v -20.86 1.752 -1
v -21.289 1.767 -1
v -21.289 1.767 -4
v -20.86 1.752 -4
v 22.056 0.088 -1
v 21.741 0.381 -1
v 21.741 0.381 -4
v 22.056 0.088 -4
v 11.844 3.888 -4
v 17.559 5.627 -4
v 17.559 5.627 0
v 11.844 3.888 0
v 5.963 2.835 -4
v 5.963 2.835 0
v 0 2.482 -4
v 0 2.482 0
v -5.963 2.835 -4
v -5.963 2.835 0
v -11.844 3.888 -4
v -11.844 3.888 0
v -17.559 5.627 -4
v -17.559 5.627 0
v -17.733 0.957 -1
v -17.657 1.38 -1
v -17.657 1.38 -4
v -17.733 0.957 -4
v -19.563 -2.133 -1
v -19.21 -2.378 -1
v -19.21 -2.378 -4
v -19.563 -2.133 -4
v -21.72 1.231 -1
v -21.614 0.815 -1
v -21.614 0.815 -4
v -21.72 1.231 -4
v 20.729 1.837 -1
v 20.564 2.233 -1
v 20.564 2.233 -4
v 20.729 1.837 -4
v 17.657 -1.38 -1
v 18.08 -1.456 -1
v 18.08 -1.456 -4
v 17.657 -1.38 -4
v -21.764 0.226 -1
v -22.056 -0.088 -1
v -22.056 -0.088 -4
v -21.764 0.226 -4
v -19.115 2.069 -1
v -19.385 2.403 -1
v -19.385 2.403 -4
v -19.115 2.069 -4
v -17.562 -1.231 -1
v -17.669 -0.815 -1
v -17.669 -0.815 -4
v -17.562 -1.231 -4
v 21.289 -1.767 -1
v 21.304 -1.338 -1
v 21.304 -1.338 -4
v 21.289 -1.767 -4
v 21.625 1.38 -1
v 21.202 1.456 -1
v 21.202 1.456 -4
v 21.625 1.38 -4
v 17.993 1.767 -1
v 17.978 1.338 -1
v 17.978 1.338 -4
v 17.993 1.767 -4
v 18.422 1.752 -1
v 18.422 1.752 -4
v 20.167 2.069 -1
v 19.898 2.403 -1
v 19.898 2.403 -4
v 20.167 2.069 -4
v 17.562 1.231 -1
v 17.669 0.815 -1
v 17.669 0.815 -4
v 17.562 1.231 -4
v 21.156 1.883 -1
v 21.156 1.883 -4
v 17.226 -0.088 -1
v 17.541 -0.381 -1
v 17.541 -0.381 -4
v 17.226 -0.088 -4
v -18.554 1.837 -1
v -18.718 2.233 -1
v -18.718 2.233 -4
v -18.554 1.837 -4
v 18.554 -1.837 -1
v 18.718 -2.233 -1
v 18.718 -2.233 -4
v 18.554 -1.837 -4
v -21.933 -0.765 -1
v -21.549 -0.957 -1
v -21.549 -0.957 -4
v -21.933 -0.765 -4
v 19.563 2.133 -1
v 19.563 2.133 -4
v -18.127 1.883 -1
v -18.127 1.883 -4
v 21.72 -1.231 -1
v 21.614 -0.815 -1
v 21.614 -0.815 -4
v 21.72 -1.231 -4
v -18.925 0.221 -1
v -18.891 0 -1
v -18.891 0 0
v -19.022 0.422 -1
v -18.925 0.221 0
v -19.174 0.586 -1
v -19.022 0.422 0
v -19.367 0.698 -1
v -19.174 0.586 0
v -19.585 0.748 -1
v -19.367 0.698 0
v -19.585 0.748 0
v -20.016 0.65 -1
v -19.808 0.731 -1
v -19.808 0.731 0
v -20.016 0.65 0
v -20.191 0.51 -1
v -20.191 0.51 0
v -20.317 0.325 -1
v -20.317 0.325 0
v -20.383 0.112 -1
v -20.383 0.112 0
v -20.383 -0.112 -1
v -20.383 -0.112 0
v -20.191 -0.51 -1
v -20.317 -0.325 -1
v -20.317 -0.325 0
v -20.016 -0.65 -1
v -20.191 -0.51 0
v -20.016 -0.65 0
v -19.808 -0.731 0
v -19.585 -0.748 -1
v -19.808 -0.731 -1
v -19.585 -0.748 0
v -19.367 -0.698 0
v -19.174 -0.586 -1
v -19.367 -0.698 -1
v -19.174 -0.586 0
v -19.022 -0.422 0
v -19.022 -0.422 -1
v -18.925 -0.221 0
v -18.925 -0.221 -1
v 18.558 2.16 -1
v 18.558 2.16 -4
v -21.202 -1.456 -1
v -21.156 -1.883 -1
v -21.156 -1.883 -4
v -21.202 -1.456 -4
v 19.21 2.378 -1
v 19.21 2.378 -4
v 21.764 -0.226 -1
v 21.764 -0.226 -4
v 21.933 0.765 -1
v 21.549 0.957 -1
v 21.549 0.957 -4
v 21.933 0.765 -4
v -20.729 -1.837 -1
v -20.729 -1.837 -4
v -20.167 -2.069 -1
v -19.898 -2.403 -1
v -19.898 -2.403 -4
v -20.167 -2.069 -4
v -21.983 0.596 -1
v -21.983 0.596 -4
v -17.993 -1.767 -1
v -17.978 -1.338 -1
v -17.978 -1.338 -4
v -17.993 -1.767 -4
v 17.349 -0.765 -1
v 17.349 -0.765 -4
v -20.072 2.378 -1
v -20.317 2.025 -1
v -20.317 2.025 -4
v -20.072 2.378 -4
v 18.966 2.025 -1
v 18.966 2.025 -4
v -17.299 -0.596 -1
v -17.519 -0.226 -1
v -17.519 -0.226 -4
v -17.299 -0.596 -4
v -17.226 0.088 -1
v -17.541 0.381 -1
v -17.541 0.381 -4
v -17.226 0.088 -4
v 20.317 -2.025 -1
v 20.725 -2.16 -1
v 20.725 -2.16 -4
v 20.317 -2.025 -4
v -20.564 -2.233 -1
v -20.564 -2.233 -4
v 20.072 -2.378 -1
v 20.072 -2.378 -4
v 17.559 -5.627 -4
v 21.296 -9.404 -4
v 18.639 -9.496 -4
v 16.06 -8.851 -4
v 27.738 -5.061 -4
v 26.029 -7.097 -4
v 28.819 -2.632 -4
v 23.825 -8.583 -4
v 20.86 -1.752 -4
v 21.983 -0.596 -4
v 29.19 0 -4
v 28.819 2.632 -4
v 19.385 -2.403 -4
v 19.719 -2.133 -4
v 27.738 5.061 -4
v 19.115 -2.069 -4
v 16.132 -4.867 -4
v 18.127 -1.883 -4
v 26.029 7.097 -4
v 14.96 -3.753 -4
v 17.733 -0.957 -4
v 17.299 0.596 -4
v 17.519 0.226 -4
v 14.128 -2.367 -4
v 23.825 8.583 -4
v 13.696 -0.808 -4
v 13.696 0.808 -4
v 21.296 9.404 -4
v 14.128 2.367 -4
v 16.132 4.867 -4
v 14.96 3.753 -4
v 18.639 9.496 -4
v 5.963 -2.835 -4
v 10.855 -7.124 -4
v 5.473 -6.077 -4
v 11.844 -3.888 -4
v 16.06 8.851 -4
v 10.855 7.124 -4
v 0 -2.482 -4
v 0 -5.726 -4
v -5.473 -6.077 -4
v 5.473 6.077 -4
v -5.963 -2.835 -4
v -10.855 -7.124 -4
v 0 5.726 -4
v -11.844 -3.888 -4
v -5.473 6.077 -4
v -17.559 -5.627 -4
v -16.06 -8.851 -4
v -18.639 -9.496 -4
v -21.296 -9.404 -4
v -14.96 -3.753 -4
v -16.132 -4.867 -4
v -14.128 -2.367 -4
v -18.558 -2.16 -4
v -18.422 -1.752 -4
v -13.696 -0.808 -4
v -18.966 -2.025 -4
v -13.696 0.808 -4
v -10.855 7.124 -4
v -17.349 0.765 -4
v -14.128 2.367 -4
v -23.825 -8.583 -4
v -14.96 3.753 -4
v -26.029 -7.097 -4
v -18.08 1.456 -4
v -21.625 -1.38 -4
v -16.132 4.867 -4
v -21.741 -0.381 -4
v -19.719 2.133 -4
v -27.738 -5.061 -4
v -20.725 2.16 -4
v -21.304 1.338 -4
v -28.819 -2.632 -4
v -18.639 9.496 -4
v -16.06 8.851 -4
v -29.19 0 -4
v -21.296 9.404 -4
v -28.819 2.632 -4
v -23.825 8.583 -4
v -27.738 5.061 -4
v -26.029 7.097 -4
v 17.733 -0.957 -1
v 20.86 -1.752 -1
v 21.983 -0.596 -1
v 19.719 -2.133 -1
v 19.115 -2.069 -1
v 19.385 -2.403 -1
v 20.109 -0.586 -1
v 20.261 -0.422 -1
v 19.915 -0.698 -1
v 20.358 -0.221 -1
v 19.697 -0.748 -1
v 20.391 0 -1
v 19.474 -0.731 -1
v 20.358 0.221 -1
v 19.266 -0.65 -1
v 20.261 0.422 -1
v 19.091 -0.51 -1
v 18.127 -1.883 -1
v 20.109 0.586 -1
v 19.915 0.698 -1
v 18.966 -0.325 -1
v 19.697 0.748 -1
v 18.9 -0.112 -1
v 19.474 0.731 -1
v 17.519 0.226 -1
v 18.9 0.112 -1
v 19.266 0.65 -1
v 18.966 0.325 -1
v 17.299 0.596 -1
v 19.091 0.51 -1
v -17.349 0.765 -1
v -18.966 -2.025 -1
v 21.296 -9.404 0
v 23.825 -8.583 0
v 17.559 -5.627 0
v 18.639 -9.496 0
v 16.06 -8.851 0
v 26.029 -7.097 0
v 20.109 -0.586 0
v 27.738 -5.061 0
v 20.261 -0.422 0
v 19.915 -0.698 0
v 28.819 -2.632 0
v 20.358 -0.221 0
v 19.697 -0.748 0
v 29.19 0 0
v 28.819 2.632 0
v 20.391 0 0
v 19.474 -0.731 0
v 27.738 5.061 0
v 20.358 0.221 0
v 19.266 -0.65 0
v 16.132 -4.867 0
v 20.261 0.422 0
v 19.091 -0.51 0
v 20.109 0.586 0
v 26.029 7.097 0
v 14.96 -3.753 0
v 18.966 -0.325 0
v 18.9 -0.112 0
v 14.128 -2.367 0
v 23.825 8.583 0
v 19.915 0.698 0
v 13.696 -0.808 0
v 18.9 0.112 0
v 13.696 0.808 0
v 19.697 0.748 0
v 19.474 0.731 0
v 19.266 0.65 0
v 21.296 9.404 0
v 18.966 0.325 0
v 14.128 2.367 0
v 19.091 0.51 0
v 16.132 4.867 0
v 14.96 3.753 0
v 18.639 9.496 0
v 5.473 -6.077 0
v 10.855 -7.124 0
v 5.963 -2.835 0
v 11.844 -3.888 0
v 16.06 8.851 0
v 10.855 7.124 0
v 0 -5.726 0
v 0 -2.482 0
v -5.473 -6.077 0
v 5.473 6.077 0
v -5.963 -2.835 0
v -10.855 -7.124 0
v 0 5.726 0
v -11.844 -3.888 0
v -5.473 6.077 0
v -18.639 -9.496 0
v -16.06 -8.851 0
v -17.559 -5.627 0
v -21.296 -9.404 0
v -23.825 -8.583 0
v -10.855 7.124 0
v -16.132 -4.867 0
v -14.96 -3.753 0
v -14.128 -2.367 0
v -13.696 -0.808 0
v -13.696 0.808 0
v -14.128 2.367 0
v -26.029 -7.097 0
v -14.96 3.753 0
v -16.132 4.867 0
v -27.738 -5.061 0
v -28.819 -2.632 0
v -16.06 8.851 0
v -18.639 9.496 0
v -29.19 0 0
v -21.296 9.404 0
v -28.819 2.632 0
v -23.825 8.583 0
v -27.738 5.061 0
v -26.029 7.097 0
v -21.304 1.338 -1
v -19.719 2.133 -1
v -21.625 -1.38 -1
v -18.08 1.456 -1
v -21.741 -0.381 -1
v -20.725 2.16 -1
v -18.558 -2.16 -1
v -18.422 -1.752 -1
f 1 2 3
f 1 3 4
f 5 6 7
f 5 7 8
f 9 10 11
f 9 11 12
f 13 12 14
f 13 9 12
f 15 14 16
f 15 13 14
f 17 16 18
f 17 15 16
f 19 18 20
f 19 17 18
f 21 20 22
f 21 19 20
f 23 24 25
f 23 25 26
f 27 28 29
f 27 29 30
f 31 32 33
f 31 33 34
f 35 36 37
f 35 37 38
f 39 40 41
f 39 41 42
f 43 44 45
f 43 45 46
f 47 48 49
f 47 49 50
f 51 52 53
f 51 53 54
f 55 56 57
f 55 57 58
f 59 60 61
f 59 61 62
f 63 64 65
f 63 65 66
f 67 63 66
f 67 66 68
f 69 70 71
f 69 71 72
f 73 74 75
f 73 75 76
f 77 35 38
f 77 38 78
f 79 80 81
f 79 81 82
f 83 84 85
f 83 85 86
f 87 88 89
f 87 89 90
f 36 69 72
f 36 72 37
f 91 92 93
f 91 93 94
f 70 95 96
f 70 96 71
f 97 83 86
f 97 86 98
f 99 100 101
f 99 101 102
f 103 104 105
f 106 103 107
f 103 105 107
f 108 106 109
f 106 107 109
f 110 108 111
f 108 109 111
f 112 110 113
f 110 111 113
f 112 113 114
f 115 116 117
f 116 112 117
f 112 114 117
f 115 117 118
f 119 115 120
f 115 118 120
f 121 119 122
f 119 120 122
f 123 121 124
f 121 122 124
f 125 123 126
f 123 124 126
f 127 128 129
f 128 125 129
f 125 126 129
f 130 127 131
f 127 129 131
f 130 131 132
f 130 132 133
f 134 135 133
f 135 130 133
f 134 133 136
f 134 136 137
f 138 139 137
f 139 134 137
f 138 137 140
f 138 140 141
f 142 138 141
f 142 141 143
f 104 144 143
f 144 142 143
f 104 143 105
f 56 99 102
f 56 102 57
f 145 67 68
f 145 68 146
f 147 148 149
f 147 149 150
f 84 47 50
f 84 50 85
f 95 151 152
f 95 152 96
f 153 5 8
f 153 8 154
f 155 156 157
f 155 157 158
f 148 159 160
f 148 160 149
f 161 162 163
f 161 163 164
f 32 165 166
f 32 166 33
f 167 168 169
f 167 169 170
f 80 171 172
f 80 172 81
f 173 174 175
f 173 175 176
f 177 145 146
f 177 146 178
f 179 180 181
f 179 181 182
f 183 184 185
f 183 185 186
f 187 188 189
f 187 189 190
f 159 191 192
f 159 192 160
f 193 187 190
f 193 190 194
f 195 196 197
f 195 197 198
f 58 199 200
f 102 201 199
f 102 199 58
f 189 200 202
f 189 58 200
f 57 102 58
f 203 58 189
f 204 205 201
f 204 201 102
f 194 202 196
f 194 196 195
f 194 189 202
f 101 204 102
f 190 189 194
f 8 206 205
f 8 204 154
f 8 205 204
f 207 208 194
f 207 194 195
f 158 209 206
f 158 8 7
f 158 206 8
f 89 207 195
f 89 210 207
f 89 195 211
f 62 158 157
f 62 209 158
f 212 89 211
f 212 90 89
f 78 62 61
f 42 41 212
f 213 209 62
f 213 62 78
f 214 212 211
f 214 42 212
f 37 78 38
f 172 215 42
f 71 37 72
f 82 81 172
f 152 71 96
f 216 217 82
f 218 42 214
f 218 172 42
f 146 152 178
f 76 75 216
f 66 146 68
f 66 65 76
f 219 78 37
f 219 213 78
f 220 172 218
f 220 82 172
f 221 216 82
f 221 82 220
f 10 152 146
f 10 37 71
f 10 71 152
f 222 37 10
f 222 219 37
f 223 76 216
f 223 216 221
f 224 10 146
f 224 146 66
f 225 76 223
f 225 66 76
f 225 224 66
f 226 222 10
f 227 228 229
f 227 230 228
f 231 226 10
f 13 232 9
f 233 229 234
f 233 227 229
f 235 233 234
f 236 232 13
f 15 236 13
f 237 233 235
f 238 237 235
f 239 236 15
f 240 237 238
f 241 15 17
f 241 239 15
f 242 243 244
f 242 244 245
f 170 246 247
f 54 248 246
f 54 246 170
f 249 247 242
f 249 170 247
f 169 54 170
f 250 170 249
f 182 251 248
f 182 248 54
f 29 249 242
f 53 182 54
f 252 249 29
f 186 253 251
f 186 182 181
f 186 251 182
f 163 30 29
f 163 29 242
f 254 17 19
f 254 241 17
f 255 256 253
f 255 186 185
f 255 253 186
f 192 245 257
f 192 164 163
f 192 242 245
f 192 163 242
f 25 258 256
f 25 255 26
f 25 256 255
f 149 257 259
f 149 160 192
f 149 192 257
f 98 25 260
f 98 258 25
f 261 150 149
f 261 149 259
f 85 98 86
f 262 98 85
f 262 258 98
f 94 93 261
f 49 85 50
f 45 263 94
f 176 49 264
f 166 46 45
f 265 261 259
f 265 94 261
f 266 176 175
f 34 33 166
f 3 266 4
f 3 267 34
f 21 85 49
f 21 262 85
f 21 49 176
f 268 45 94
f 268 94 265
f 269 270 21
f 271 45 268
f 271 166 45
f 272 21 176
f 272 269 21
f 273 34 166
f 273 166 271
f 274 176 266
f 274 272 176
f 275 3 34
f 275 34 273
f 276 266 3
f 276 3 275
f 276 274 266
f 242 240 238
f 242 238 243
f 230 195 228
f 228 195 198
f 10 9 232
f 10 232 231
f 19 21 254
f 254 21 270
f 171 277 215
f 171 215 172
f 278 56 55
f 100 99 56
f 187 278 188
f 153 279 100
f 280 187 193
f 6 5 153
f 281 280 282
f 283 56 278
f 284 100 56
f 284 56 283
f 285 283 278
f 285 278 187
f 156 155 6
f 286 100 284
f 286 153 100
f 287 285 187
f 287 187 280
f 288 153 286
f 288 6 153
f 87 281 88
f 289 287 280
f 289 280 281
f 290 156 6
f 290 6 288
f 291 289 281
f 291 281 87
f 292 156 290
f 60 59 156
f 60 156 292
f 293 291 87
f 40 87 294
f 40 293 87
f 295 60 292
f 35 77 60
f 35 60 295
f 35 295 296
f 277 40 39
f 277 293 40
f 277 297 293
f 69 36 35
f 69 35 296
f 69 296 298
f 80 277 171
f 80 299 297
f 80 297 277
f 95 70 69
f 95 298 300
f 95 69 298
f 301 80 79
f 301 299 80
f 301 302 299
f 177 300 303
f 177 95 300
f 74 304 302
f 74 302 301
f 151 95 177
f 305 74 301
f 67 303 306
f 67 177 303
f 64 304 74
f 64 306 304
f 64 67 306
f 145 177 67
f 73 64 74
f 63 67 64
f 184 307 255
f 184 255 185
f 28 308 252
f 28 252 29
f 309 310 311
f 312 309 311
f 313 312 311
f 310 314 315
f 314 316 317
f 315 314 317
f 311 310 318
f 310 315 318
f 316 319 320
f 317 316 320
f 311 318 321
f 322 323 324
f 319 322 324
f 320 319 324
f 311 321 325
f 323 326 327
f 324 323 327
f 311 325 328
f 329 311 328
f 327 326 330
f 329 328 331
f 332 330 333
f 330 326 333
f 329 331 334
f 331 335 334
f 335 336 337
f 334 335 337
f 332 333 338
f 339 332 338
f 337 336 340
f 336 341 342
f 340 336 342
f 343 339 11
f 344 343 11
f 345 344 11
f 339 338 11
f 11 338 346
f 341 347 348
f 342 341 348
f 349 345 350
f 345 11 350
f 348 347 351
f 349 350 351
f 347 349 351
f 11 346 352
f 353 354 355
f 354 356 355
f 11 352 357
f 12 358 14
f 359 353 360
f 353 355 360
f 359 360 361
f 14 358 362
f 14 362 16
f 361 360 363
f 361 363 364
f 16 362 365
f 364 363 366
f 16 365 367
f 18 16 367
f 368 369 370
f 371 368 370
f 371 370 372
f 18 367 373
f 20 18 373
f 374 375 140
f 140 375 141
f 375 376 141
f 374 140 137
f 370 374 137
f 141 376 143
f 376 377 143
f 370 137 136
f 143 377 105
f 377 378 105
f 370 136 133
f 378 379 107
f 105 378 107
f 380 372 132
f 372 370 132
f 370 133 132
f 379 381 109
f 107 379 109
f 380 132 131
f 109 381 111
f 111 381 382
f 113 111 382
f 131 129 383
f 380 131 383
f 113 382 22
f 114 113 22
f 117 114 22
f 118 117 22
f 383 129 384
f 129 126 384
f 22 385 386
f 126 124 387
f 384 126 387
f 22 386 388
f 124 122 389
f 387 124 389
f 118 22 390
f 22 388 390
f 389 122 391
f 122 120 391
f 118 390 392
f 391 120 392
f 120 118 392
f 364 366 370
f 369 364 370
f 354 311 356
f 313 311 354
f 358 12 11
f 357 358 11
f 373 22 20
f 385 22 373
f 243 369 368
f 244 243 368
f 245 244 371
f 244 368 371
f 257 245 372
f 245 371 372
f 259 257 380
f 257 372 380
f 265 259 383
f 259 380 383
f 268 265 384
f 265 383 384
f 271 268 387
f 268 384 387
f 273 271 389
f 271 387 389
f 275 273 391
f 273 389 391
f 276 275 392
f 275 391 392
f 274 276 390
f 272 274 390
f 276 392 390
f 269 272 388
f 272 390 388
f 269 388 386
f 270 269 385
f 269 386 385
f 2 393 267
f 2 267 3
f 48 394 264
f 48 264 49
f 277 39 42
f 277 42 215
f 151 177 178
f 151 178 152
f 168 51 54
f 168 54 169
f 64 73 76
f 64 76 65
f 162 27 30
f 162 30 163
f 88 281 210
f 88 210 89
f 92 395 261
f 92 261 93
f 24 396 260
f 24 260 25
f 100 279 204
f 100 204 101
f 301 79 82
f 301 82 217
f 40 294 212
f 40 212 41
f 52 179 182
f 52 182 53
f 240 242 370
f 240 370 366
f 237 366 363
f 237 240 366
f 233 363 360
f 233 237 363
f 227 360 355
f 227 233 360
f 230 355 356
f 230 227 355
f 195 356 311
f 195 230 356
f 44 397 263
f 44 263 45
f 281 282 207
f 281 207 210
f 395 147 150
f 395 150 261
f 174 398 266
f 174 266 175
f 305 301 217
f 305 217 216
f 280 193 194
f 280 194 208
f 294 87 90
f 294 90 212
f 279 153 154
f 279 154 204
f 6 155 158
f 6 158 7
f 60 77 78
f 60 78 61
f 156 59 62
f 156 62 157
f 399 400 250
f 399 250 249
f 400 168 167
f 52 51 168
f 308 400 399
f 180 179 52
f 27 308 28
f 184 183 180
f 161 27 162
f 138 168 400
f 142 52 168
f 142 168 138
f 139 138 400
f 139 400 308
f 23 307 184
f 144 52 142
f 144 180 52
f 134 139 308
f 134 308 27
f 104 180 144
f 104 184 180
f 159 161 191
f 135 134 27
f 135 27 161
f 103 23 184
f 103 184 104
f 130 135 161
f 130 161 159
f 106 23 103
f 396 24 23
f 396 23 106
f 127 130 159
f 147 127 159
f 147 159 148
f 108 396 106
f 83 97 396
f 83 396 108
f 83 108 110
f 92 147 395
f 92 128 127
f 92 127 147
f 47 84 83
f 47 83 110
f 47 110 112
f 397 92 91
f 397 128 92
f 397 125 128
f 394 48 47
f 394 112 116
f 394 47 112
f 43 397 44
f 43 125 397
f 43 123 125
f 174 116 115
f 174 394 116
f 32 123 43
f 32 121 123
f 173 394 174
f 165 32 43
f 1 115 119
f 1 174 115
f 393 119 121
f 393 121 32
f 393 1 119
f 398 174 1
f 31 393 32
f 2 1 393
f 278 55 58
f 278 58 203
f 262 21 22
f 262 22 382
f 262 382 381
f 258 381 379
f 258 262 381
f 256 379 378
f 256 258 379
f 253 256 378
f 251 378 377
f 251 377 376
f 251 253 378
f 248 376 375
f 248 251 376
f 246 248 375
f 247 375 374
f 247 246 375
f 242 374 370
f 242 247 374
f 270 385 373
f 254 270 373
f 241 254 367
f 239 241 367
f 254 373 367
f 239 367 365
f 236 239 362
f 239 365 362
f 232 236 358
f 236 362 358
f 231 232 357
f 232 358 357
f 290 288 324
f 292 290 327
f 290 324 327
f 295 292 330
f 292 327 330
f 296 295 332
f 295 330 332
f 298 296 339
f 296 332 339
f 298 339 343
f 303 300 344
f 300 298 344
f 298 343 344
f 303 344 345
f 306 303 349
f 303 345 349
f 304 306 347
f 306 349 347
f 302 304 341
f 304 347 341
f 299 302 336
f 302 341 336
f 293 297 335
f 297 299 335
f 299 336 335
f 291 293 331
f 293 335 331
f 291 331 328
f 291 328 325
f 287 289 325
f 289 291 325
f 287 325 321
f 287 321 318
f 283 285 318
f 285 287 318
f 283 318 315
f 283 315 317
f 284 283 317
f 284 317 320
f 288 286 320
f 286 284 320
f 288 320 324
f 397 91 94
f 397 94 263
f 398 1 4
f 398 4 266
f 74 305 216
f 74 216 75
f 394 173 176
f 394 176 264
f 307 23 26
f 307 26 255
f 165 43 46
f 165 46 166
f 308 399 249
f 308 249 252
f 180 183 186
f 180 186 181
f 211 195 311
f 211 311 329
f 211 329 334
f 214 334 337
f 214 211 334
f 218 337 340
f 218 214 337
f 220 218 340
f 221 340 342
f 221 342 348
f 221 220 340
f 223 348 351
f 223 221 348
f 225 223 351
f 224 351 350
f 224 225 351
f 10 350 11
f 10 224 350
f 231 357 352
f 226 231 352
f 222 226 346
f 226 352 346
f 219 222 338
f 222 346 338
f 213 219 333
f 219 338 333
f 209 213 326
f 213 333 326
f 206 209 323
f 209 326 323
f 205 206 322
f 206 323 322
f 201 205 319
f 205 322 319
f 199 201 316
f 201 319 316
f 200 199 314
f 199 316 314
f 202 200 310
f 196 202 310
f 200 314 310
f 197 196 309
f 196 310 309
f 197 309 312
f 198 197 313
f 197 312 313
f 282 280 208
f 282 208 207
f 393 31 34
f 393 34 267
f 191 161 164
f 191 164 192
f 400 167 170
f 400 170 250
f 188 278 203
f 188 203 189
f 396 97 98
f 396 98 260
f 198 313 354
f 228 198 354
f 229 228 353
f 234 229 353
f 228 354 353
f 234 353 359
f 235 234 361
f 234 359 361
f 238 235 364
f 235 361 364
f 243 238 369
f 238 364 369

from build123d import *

# Parameters (mm, degrees)
SKIZZE1_R                           = 0.75
AUFSATZ_LINEAR_AUSTRAGEN1_DEPTH     = 4
SCHNITT_LINEAR_START                = -3
SCHNITT_LINEAR_AUSTRAGEN2_OUTLINE_R = 0.75
SCHNITT_LINEAR_AUSTRAGEN2_DEPTH     = 3
SCHNITT_LINEAR_AUSTRAGEN3_DEPTH     = 10


# Read off the part's stored shape, not the designer's step: Schnitt-Linear austragen2
with BuildPart() as part:
    # Skizze1 → Aufsatz-Linear austragen1 (new body)
    with BuildSketch(Plane.XY):
        with BuildLine():
            ThreePointArc((-16.060120321, 8.85129891), (0, 5.725515256), (16.060120321, 8.85129891))
            ThreePointArc((16.060120321, 8.85129891), (29.189527365, 0), (16.060120321, -8.85129891))
            ThreePointArc((16.060120321, -8.85129891), (0, -5.725515256), (-16.060120321, -8.85129891))
            ThreePointArc((-16.060120321, -8.85129891), (-29.189527365, 0), (-16.060120321, 8.85129891))
        make_face()
        with Locations((-19.641235471, 0)):
            Circle(SKIZZE1_R, mode=Mode.SUBTRACT)
        with Locations((19.641235471, 0)):
            Circle(SKIZZE1_R, mode=Mode.SUBTRACT)
    extrude(amount=-AUFSATZ_LINEAR_AUSTRAGEN1_DEPTH)

    # Schnitt-Linear austragen2 outline → Schnitt-Linear austragen2 (cut)
    # profile 1 of 2: a face of its own
    with BuildSketch(Plane(origin=(0, 0, -4), x_dir=(-1, 0, 0), z_dir=(0, 0, -1)).offset(SCHNITT_LINEAR_START)):
        Polygon((20.724665483, 2.159923975), (20.316960681, 2.024603637), (20.072258051, 2.377669385), (19.719192303, 2.132966755), (19.384931733, 2.402790162), (19.115108326, 2.068529592), (18.718369619, 2.23325117), (18.553648041, 1.836512464), (18.126572608, 1.88278745), (18.080297621, 1.455712017), (17.657484574, 1.379791488), (17.733405103, 0.956978441), (17.34910824, 0.765013026), (17.541073655, 0.380716163), (17.226426423, 0.088257758), (17.518884828, -0.226389475), (17.299378073, -0.595647629), (17.668636227, -0.815154384), (17.562053082, -1.231297187), (17.978195885, -1.337880332), (17.993171082, -1.76719437), (18.42248512, -1.752219173), (18.557805458, -2.159923975), (18.965510261, -2.024603637), (19.210212891, -2.377669385), (19.563278639, -2.132966755), (19.897539209, -2.402790162), (20.167362616, -2.068529592), (20.564101323, -2.23325117), (20.728822901, -1.836512464), (21.155898334, -1.88278745), (21.20217332, -1.455712017), (21.624986367, -1.379791488), (21.549065838, -0.956978441), (21.933362701, -0.765013026), (21.741397286, -0.380716163), (22.056044519, -0.088257758), (21.763586114, 0.226389475), (21.983092869, 0.595647629), (21.613834715, 0.815154384), (21.72041786, 1.231297187), (21.304275056, 1.337880332), (21.289299859, 1.76719437), (20.859985821, 1.752219173), align=None)
        with Locations((19.641235471, 0)):
            Circle(SCHNITT_LINEAR_AUSTRAGEN2_OUTLINE_R, mode=Mode.SUBTRACT)
    # profile 2 of 2: a face of its own
    with BuildSketch(Plane(origin=(0, 0, -4), x_dir=(-1, 0, 0), z_dir=(0, 0, -1)).offset(SCHNITT_LINEAR_START)):
        Polygon((-18.557805458, 2.159923975), (-18.965510261, 2.024603637), (-19.210212891, 2.377669385), (-19.563278639, 2.132966755), (-19.897539209, 2.402790162), (-20.167362616, 2.068529592), (-20.564101323, 2.23325117), (-20.728822901, 1.836512464), (-21.155898334, 1.88278745), (-21.20217332, 1.455712017), (-21.624986367, 1.379791488), (-21.549065838, 0.956978441), (-21.933362701, 0.765013026), (-21.741397286, 0.380716163), (-22.056044519, 0.088257758), (-21.763586114, -0.226389475), (-21.983092869, -0.595647629), (-21.613834715, -0.815154384), (-21.72041786, -1.231297187), (-21.304275056, -1.337880332), (-21.289299859, -1.76719437), (-20.859985821, -1.752219173), (-20.724665483, -2.159923975), (-20.316960681, -2.024603637), (-20.072258051, -2.377669385), (-19.719192303, -2.132966755), (-19.384931733, -2.402790162), (-19.115108326, -2.068529592), (-18.718369619, -2.23325117), (-18.553648041, -1.836512464), (-18.126572608, -1.88278745), (-18.080297621, -1.455712017), (-17.657484574, -1.379791488), (-17.733405103, -0.956978441), (-17.34910824, -0.765013026), (-17.541073655, -0.380716163), (-17.226426423, -0.088257758), (-17.518884828, 0.226389475), (-17.299378073, 0.595647629), (-17.668636227, 0.815154384), (-17.562053082, 1.231297187), (-17.978195885, 1.337880332), (-17.993171082, 1.76719437), (-18.42248512, 1.752219173), align=None)
        with Locations((-19.641235471, 0)):
            Circle(SCHNITT_LINEAR_AUSTRAGEN2_OUTLINE_R, mode=Mode.SUBTRACT)
    extrude(amount=SCHNITT_LINEAR_AUSTRAGEN2_DEPTH, mode=Mode.SUBTRACT)

    # Skizze4 → Schnitt-Linear austragen3 (cut)
    with BuildSketch(Plane(origin=(0, 0, -4), x_dir=(-1, 0, 0), z_dir=(0, 0, -1))):
        with BuildLine():
            ThreePointArc((-17.558911686, -5.627070966), (-13.641235471, 0), (-17.558911686, 5.627070966))
            ThreePointArc((-17.558911686, 5.627070966), (0, 2.482397681), (17.558911686, 5.627070966))
            ThreePointArc((17.558911686, 5.627070966), (13.641235471, 0), (17.558911686, -5.627070966))
            ThreePointArc((17.558911686, -5.627070966), (0, -2.482397681), (-17.558911686, -5.627070966))
        make_face()
    extrude(amount=-SCHNITT_LINEAR_AUSTRAGEN3_DEPTH, mode=Mode.SUBTRACT)


solid = part.part
